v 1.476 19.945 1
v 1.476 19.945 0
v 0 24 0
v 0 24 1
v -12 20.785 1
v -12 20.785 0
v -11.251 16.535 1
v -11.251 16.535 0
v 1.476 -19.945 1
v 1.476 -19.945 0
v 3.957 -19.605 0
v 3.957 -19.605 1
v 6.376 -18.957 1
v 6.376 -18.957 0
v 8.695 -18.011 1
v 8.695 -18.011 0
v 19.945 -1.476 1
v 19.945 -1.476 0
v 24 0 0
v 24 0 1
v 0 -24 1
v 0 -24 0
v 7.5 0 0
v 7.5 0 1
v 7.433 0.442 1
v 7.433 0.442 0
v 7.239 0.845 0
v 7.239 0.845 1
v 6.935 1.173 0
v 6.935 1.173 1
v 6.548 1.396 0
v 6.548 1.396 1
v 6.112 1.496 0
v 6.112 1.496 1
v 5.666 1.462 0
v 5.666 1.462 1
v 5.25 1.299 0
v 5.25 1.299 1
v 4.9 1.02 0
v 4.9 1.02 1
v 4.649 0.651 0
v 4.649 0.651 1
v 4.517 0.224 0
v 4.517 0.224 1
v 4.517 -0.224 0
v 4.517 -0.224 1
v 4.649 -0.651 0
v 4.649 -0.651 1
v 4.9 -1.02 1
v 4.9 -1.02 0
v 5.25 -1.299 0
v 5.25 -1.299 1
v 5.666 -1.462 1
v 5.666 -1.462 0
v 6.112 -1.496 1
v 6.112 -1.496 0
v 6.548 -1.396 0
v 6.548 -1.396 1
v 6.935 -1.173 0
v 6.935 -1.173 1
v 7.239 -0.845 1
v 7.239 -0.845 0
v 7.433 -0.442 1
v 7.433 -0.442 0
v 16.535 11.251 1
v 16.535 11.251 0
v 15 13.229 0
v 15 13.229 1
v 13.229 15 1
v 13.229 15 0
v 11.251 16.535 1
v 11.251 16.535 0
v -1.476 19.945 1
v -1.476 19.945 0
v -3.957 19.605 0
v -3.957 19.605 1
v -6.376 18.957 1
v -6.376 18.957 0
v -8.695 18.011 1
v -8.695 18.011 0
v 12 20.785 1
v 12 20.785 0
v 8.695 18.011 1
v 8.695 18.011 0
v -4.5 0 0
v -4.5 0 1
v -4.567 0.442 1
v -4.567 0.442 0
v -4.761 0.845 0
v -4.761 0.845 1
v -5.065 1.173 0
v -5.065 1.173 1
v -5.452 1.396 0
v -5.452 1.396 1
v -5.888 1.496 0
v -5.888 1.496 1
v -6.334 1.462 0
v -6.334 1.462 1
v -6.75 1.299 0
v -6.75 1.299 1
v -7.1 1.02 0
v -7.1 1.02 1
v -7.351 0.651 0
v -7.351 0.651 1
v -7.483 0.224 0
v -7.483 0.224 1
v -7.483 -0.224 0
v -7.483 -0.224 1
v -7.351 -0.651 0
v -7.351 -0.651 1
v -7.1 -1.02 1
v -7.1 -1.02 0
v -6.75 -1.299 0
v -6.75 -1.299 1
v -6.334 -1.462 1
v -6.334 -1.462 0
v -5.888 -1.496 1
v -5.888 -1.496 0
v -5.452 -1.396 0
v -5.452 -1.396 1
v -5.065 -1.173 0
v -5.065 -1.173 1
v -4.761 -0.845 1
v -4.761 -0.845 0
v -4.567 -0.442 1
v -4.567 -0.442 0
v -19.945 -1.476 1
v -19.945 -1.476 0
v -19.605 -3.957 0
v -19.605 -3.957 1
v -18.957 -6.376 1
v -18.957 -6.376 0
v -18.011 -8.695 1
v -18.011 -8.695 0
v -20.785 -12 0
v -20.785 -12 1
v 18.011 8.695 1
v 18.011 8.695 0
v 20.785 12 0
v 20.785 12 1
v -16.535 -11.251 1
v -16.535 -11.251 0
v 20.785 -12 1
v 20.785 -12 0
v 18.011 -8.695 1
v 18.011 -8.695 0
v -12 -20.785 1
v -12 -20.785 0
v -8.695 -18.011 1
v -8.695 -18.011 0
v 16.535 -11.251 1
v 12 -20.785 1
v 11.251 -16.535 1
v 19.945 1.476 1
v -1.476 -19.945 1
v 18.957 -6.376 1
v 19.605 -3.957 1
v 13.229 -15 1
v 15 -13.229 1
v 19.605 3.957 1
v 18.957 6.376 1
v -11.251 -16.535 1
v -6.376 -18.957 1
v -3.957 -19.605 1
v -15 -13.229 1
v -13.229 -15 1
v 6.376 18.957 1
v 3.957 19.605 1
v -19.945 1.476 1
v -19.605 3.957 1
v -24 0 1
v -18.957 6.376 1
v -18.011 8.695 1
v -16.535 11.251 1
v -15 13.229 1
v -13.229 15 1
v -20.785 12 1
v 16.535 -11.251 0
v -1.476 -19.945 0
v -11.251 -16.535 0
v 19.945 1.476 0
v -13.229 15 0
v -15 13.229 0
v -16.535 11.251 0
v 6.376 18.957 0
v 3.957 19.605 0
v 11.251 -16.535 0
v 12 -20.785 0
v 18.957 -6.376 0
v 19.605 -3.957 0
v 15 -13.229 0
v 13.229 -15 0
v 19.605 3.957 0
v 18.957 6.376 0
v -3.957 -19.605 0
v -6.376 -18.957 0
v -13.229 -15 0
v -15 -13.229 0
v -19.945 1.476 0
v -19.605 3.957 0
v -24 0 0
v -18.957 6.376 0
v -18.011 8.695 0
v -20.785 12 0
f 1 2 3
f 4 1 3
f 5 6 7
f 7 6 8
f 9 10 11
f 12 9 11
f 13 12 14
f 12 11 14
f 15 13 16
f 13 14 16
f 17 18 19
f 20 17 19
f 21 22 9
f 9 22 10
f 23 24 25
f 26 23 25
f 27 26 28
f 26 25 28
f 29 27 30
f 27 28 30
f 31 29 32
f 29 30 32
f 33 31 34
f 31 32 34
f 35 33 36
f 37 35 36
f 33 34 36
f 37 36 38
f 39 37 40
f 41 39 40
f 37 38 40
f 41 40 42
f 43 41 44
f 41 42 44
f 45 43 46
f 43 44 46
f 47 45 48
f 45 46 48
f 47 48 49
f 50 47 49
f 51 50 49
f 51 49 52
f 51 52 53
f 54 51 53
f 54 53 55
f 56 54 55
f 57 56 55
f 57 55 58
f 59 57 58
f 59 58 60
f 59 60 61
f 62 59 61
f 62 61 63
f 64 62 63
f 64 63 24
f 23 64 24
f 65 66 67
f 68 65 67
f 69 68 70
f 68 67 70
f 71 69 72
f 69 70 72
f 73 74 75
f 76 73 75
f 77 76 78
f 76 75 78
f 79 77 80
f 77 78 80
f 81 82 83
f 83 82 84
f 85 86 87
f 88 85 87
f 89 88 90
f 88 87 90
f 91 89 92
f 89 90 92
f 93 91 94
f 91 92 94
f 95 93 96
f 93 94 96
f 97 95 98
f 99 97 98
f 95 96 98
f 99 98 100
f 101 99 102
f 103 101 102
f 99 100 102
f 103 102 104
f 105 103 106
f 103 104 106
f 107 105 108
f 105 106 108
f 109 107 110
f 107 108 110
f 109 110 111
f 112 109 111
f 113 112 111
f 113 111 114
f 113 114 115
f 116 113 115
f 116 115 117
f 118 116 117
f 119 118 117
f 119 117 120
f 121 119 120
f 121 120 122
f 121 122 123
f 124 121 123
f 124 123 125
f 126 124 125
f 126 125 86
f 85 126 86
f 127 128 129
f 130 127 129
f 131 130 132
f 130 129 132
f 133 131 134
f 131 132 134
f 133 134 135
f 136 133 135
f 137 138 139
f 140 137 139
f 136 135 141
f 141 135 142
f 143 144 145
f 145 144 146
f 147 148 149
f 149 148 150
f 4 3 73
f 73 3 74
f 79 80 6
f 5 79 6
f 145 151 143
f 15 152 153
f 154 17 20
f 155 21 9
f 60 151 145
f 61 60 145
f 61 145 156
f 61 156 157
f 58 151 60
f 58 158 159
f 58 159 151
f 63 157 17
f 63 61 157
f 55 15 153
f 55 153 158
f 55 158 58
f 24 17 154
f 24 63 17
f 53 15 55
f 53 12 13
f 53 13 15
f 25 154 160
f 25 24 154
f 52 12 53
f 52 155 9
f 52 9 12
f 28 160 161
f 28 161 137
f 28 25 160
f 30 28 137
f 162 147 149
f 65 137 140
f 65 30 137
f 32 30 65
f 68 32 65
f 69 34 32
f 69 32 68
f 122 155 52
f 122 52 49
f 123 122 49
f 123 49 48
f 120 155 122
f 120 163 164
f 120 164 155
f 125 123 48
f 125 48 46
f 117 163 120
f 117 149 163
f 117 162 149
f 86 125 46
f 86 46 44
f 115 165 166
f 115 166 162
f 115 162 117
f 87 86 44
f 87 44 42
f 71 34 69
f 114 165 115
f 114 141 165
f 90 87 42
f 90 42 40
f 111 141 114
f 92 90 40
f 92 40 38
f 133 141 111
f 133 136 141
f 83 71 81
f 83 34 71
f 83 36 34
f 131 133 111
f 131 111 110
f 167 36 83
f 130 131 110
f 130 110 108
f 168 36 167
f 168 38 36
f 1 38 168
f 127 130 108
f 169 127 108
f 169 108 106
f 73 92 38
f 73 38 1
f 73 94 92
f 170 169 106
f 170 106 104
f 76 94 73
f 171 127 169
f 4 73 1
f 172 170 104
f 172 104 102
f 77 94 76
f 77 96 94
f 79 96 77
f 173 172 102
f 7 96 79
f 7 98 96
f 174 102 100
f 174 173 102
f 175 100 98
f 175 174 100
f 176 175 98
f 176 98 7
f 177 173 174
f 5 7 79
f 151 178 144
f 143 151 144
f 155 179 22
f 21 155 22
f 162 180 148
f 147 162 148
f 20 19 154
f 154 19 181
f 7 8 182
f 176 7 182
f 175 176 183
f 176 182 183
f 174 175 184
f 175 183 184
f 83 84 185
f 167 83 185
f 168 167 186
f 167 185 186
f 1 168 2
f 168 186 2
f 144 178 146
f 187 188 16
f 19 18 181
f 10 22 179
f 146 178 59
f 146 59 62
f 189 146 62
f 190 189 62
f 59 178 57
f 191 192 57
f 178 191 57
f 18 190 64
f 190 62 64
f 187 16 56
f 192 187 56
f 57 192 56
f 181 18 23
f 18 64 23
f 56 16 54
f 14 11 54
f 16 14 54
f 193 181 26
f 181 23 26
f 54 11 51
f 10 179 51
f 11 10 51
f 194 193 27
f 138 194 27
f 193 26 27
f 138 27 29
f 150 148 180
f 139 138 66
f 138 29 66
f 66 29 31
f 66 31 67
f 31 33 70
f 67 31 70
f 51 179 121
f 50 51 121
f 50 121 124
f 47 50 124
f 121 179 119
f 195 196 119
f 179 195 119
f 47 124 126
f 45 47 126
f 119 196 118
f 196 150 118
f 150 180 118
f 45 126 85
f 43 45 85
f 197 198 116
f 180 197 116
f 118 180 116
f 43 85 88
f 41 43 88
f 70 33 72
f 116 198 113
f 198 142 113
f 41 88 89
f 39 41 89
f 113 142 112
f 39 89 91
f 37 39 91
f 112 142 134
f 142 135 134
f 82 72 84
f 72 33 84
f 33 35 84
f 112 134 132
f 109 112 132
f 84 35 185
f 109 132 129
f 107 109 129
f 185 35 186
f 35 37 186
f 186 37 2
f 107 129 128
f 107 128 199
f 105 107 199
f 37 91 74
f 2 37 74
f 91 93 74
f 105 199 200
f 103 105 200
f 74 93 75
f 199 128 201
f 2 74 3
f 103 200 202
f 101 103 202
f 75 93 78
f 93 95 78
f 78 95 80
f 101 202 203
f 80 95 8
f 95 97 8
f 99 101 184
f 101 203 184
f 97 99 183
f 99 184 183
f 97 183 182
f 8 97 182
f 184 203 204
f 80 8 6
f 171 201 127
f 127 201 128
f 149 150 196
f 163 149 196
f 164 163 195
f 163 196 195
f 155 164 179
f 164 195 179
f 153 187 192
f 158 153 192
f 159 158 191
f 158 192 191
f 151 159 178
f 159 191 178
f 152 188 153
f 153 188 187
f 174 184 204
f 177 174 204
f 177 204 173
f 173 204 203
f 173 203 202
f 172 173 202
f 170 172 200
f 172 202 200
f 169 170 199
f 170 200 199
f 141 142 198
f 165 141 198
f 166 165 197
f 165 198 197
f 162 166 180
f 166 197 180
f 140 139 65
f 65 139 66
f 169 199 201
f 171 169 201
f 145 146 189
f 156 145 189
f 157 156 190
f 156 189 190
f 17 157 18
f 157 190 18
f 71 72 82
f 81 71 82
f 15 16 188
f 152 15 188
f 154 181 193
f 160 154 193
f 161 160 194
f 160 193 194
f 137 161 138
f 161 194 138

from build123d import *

# Parameters (mm, degrees)
CROQUIS1_R              = 20
SALIENTE_EXTRUIR1_DEPTH = 1
SALIENTE_EXTRUIR2_DEPTH = 1
CORTAR_EXTRUIR1_REACH   = 35.956
CROQUIS4_R              = 1.5


with BuildPart() as part:
    # Croquis1 → Saliente-Extruir1 (new body)
    with BuildSketch(Plane(origin=(0, 0, 0), x_dir=(0, 1, 0), z_dir=(0, 0, 1))):
        with Locations(Location((0, 0, 0), (0, 0, 270))):
            Circle(CROQUIS1_R)
    extrude(amount=SALIENTE_EXTRUIR1_DEPTH)

    # Croquis2 → Saliente-Extruir2 (add)
    with BuildSketch(Plane(origin=(0, 0, 0), x_dir=(0, 1, 0), z_dir=(0, 0, 1))):
        with BuildLine():
            Line((0, -24), (1.47572399, -19.945481661))
            ThreePointArc((1.47572399, -19.945481661), (0, -20), (-1.47572399, -19.945481661))
            Line((-1.47572399, -19.945481661), (0, -24))
        make_face()
        with BuildLine():
            Line((-12, -20.784609691), (-8.694726367, -18.011155804))
            ThreePointArc((-8.694726367, -18.011155804), (-10, -17.320508076), (-11.250755295, -16.535431815))
            Line((-11.250755295, -16.535431815), (-12, -20.784609691))
        make_face()
        with BuildLine():
            Line((-20.784609691, -12), (-16.535431815, -11.250755295))
            ThreePointArc((-16.535431815, -11.250755295), (-17.320508076, -10), (-18.011155804, -8.694726367))
            Line((-18.011155804, -8.694726367), (-20.784609691, -12))
        make_face()
        with BuildLine():
            Line((-24, 0), (-19.945481661, -1.47572399))
            ThreePointArc((-19.945481661, -1.47572399), (-20, 0), (-19.945481661, 1.47572399))
            Line((-19.945481661, 1.47572399), (-24, 0))
        make_face()
        with BuildLine():
            Line((-20.784609691, 12), (-18.011155804, 8.694726367))
            ThreePointArc((-18.011155804, 8.694726367), (-17.320508076, 10), (-16.535431815, 11.250755295))
            Line((-16.535431815, 11.250755295), (-20.784609691, 12))
        make_face()
        with BuildLine():
            Line((-12, 20.784609691), (-11.250755295, 16.535431815))
            ThreePointArc((-11.250755295, 16.535431815), (-10, 17.320508076), (-8.694726367, 18.011155804))
            Line((-8.694726367, 18.011155804), (-12, 20.784609691))
        make_face()
        with BuildLine():
            Line((0, 24), (-1.47572399, 19.945481661))
            ThreePointArc((-1.47572399, 19.945481661), (0, 20), (1.47572399, 19.945481661))
            Line((1.47572399, 19.945481661), (0, 24))
        make_face()
        with BuildLine():
            Line((12, 20.784609691), (8.694726367, 18.011155804))
            ThreePointArc((8.694726367, 18.011155804), (10, 17.320508076), (11.250755295, 16.535431815))
            Line((11.250755295, 16.535431815), (12, 20.784609691))
        make_face()
        with BuildLine():
            Line((20.784609691, 12), (16.535431815, 11.250755295))
            ThreePointArc((16.535431815, 11.250755295), (17.320508076, 10), (18.011155804, 8.694726367))
            Line((18.011155804, 8.694726367), (20.784609691, 12))
        make_face()
        with BuildLine():
            Line((24, 0), (19.945481661, 1.47572399))
            ThreePointArc((19.945481661, 1.47572399), (20, 0), (19.945481661, -1.47572399))
            Line((19.945481661, -1.47572399), (24, 0))
        make_face()
        with BuildLine():
            Line((20.784609691, -12), (18.011155804, -8.694726367))
            ThreePointArc((18.011155804, -8.694726367), (17.320508076, -10), (16.535431815, -11.250755295))
            Line((16.535431815, -11.250755295), (20.784609691, -12))
        make_face()
        with BuildLine():
            Line((12, -20.784609691), (11.250755295, -16.535431815))
            ThreePointArc((11.250755295, -16.535431815), (10, -17.320508076), (8.694726367, -18.011155804))
            Line((8.694726367, -18.011155804), (12, -20.784609691))
        make_face()
    extrude(amount=SALIENTE_EXTRUIR2_DEPTH)

    # Croquis4 → Cortar-Extruir1 (cut, up to next)
    with BuildSketch(Plane.XY.offset(1), mode=Mode.PRIVATE) as cortar_extruir1_sk1:
        with Locations((6, 0)):
            Circle(CROQUIS4_R)
    cortar_extruir1_tool1 = extrude(cortar_extruir1_sk1.sketch, amount=-CORTAR_EXTRUIR1_REACH, mode=Mode.PRIVATE) & part.part
    # Croquis4 → Cortar-Extruir1 (cut, up to next)
    with BuildSketch(Plane.XY.offset(1), mode=Mode.PRIVATE) as cortar_extruir1_sk2:
        with Locations((-6, 0)):
            Circle(CROQUIS4_R)
    cortar_extruir1_tool2 = extrude(cortar_extruir1_sk2.sketch, amount=-CORTAR_EXTRUIR1_REACH, mode=Mode.PRIVATE) & part.part
    add(cortar_extruir1_tool1.solids().sort_by_distance((6, 0, 1))[0], mode=Mode.SUBTRACT)
    add(cortar_extruir1_tool2.solids().sort_by_distance((-6, 0, 1))[0], mode=Mode.SUBTRACT)


solid = part.part
